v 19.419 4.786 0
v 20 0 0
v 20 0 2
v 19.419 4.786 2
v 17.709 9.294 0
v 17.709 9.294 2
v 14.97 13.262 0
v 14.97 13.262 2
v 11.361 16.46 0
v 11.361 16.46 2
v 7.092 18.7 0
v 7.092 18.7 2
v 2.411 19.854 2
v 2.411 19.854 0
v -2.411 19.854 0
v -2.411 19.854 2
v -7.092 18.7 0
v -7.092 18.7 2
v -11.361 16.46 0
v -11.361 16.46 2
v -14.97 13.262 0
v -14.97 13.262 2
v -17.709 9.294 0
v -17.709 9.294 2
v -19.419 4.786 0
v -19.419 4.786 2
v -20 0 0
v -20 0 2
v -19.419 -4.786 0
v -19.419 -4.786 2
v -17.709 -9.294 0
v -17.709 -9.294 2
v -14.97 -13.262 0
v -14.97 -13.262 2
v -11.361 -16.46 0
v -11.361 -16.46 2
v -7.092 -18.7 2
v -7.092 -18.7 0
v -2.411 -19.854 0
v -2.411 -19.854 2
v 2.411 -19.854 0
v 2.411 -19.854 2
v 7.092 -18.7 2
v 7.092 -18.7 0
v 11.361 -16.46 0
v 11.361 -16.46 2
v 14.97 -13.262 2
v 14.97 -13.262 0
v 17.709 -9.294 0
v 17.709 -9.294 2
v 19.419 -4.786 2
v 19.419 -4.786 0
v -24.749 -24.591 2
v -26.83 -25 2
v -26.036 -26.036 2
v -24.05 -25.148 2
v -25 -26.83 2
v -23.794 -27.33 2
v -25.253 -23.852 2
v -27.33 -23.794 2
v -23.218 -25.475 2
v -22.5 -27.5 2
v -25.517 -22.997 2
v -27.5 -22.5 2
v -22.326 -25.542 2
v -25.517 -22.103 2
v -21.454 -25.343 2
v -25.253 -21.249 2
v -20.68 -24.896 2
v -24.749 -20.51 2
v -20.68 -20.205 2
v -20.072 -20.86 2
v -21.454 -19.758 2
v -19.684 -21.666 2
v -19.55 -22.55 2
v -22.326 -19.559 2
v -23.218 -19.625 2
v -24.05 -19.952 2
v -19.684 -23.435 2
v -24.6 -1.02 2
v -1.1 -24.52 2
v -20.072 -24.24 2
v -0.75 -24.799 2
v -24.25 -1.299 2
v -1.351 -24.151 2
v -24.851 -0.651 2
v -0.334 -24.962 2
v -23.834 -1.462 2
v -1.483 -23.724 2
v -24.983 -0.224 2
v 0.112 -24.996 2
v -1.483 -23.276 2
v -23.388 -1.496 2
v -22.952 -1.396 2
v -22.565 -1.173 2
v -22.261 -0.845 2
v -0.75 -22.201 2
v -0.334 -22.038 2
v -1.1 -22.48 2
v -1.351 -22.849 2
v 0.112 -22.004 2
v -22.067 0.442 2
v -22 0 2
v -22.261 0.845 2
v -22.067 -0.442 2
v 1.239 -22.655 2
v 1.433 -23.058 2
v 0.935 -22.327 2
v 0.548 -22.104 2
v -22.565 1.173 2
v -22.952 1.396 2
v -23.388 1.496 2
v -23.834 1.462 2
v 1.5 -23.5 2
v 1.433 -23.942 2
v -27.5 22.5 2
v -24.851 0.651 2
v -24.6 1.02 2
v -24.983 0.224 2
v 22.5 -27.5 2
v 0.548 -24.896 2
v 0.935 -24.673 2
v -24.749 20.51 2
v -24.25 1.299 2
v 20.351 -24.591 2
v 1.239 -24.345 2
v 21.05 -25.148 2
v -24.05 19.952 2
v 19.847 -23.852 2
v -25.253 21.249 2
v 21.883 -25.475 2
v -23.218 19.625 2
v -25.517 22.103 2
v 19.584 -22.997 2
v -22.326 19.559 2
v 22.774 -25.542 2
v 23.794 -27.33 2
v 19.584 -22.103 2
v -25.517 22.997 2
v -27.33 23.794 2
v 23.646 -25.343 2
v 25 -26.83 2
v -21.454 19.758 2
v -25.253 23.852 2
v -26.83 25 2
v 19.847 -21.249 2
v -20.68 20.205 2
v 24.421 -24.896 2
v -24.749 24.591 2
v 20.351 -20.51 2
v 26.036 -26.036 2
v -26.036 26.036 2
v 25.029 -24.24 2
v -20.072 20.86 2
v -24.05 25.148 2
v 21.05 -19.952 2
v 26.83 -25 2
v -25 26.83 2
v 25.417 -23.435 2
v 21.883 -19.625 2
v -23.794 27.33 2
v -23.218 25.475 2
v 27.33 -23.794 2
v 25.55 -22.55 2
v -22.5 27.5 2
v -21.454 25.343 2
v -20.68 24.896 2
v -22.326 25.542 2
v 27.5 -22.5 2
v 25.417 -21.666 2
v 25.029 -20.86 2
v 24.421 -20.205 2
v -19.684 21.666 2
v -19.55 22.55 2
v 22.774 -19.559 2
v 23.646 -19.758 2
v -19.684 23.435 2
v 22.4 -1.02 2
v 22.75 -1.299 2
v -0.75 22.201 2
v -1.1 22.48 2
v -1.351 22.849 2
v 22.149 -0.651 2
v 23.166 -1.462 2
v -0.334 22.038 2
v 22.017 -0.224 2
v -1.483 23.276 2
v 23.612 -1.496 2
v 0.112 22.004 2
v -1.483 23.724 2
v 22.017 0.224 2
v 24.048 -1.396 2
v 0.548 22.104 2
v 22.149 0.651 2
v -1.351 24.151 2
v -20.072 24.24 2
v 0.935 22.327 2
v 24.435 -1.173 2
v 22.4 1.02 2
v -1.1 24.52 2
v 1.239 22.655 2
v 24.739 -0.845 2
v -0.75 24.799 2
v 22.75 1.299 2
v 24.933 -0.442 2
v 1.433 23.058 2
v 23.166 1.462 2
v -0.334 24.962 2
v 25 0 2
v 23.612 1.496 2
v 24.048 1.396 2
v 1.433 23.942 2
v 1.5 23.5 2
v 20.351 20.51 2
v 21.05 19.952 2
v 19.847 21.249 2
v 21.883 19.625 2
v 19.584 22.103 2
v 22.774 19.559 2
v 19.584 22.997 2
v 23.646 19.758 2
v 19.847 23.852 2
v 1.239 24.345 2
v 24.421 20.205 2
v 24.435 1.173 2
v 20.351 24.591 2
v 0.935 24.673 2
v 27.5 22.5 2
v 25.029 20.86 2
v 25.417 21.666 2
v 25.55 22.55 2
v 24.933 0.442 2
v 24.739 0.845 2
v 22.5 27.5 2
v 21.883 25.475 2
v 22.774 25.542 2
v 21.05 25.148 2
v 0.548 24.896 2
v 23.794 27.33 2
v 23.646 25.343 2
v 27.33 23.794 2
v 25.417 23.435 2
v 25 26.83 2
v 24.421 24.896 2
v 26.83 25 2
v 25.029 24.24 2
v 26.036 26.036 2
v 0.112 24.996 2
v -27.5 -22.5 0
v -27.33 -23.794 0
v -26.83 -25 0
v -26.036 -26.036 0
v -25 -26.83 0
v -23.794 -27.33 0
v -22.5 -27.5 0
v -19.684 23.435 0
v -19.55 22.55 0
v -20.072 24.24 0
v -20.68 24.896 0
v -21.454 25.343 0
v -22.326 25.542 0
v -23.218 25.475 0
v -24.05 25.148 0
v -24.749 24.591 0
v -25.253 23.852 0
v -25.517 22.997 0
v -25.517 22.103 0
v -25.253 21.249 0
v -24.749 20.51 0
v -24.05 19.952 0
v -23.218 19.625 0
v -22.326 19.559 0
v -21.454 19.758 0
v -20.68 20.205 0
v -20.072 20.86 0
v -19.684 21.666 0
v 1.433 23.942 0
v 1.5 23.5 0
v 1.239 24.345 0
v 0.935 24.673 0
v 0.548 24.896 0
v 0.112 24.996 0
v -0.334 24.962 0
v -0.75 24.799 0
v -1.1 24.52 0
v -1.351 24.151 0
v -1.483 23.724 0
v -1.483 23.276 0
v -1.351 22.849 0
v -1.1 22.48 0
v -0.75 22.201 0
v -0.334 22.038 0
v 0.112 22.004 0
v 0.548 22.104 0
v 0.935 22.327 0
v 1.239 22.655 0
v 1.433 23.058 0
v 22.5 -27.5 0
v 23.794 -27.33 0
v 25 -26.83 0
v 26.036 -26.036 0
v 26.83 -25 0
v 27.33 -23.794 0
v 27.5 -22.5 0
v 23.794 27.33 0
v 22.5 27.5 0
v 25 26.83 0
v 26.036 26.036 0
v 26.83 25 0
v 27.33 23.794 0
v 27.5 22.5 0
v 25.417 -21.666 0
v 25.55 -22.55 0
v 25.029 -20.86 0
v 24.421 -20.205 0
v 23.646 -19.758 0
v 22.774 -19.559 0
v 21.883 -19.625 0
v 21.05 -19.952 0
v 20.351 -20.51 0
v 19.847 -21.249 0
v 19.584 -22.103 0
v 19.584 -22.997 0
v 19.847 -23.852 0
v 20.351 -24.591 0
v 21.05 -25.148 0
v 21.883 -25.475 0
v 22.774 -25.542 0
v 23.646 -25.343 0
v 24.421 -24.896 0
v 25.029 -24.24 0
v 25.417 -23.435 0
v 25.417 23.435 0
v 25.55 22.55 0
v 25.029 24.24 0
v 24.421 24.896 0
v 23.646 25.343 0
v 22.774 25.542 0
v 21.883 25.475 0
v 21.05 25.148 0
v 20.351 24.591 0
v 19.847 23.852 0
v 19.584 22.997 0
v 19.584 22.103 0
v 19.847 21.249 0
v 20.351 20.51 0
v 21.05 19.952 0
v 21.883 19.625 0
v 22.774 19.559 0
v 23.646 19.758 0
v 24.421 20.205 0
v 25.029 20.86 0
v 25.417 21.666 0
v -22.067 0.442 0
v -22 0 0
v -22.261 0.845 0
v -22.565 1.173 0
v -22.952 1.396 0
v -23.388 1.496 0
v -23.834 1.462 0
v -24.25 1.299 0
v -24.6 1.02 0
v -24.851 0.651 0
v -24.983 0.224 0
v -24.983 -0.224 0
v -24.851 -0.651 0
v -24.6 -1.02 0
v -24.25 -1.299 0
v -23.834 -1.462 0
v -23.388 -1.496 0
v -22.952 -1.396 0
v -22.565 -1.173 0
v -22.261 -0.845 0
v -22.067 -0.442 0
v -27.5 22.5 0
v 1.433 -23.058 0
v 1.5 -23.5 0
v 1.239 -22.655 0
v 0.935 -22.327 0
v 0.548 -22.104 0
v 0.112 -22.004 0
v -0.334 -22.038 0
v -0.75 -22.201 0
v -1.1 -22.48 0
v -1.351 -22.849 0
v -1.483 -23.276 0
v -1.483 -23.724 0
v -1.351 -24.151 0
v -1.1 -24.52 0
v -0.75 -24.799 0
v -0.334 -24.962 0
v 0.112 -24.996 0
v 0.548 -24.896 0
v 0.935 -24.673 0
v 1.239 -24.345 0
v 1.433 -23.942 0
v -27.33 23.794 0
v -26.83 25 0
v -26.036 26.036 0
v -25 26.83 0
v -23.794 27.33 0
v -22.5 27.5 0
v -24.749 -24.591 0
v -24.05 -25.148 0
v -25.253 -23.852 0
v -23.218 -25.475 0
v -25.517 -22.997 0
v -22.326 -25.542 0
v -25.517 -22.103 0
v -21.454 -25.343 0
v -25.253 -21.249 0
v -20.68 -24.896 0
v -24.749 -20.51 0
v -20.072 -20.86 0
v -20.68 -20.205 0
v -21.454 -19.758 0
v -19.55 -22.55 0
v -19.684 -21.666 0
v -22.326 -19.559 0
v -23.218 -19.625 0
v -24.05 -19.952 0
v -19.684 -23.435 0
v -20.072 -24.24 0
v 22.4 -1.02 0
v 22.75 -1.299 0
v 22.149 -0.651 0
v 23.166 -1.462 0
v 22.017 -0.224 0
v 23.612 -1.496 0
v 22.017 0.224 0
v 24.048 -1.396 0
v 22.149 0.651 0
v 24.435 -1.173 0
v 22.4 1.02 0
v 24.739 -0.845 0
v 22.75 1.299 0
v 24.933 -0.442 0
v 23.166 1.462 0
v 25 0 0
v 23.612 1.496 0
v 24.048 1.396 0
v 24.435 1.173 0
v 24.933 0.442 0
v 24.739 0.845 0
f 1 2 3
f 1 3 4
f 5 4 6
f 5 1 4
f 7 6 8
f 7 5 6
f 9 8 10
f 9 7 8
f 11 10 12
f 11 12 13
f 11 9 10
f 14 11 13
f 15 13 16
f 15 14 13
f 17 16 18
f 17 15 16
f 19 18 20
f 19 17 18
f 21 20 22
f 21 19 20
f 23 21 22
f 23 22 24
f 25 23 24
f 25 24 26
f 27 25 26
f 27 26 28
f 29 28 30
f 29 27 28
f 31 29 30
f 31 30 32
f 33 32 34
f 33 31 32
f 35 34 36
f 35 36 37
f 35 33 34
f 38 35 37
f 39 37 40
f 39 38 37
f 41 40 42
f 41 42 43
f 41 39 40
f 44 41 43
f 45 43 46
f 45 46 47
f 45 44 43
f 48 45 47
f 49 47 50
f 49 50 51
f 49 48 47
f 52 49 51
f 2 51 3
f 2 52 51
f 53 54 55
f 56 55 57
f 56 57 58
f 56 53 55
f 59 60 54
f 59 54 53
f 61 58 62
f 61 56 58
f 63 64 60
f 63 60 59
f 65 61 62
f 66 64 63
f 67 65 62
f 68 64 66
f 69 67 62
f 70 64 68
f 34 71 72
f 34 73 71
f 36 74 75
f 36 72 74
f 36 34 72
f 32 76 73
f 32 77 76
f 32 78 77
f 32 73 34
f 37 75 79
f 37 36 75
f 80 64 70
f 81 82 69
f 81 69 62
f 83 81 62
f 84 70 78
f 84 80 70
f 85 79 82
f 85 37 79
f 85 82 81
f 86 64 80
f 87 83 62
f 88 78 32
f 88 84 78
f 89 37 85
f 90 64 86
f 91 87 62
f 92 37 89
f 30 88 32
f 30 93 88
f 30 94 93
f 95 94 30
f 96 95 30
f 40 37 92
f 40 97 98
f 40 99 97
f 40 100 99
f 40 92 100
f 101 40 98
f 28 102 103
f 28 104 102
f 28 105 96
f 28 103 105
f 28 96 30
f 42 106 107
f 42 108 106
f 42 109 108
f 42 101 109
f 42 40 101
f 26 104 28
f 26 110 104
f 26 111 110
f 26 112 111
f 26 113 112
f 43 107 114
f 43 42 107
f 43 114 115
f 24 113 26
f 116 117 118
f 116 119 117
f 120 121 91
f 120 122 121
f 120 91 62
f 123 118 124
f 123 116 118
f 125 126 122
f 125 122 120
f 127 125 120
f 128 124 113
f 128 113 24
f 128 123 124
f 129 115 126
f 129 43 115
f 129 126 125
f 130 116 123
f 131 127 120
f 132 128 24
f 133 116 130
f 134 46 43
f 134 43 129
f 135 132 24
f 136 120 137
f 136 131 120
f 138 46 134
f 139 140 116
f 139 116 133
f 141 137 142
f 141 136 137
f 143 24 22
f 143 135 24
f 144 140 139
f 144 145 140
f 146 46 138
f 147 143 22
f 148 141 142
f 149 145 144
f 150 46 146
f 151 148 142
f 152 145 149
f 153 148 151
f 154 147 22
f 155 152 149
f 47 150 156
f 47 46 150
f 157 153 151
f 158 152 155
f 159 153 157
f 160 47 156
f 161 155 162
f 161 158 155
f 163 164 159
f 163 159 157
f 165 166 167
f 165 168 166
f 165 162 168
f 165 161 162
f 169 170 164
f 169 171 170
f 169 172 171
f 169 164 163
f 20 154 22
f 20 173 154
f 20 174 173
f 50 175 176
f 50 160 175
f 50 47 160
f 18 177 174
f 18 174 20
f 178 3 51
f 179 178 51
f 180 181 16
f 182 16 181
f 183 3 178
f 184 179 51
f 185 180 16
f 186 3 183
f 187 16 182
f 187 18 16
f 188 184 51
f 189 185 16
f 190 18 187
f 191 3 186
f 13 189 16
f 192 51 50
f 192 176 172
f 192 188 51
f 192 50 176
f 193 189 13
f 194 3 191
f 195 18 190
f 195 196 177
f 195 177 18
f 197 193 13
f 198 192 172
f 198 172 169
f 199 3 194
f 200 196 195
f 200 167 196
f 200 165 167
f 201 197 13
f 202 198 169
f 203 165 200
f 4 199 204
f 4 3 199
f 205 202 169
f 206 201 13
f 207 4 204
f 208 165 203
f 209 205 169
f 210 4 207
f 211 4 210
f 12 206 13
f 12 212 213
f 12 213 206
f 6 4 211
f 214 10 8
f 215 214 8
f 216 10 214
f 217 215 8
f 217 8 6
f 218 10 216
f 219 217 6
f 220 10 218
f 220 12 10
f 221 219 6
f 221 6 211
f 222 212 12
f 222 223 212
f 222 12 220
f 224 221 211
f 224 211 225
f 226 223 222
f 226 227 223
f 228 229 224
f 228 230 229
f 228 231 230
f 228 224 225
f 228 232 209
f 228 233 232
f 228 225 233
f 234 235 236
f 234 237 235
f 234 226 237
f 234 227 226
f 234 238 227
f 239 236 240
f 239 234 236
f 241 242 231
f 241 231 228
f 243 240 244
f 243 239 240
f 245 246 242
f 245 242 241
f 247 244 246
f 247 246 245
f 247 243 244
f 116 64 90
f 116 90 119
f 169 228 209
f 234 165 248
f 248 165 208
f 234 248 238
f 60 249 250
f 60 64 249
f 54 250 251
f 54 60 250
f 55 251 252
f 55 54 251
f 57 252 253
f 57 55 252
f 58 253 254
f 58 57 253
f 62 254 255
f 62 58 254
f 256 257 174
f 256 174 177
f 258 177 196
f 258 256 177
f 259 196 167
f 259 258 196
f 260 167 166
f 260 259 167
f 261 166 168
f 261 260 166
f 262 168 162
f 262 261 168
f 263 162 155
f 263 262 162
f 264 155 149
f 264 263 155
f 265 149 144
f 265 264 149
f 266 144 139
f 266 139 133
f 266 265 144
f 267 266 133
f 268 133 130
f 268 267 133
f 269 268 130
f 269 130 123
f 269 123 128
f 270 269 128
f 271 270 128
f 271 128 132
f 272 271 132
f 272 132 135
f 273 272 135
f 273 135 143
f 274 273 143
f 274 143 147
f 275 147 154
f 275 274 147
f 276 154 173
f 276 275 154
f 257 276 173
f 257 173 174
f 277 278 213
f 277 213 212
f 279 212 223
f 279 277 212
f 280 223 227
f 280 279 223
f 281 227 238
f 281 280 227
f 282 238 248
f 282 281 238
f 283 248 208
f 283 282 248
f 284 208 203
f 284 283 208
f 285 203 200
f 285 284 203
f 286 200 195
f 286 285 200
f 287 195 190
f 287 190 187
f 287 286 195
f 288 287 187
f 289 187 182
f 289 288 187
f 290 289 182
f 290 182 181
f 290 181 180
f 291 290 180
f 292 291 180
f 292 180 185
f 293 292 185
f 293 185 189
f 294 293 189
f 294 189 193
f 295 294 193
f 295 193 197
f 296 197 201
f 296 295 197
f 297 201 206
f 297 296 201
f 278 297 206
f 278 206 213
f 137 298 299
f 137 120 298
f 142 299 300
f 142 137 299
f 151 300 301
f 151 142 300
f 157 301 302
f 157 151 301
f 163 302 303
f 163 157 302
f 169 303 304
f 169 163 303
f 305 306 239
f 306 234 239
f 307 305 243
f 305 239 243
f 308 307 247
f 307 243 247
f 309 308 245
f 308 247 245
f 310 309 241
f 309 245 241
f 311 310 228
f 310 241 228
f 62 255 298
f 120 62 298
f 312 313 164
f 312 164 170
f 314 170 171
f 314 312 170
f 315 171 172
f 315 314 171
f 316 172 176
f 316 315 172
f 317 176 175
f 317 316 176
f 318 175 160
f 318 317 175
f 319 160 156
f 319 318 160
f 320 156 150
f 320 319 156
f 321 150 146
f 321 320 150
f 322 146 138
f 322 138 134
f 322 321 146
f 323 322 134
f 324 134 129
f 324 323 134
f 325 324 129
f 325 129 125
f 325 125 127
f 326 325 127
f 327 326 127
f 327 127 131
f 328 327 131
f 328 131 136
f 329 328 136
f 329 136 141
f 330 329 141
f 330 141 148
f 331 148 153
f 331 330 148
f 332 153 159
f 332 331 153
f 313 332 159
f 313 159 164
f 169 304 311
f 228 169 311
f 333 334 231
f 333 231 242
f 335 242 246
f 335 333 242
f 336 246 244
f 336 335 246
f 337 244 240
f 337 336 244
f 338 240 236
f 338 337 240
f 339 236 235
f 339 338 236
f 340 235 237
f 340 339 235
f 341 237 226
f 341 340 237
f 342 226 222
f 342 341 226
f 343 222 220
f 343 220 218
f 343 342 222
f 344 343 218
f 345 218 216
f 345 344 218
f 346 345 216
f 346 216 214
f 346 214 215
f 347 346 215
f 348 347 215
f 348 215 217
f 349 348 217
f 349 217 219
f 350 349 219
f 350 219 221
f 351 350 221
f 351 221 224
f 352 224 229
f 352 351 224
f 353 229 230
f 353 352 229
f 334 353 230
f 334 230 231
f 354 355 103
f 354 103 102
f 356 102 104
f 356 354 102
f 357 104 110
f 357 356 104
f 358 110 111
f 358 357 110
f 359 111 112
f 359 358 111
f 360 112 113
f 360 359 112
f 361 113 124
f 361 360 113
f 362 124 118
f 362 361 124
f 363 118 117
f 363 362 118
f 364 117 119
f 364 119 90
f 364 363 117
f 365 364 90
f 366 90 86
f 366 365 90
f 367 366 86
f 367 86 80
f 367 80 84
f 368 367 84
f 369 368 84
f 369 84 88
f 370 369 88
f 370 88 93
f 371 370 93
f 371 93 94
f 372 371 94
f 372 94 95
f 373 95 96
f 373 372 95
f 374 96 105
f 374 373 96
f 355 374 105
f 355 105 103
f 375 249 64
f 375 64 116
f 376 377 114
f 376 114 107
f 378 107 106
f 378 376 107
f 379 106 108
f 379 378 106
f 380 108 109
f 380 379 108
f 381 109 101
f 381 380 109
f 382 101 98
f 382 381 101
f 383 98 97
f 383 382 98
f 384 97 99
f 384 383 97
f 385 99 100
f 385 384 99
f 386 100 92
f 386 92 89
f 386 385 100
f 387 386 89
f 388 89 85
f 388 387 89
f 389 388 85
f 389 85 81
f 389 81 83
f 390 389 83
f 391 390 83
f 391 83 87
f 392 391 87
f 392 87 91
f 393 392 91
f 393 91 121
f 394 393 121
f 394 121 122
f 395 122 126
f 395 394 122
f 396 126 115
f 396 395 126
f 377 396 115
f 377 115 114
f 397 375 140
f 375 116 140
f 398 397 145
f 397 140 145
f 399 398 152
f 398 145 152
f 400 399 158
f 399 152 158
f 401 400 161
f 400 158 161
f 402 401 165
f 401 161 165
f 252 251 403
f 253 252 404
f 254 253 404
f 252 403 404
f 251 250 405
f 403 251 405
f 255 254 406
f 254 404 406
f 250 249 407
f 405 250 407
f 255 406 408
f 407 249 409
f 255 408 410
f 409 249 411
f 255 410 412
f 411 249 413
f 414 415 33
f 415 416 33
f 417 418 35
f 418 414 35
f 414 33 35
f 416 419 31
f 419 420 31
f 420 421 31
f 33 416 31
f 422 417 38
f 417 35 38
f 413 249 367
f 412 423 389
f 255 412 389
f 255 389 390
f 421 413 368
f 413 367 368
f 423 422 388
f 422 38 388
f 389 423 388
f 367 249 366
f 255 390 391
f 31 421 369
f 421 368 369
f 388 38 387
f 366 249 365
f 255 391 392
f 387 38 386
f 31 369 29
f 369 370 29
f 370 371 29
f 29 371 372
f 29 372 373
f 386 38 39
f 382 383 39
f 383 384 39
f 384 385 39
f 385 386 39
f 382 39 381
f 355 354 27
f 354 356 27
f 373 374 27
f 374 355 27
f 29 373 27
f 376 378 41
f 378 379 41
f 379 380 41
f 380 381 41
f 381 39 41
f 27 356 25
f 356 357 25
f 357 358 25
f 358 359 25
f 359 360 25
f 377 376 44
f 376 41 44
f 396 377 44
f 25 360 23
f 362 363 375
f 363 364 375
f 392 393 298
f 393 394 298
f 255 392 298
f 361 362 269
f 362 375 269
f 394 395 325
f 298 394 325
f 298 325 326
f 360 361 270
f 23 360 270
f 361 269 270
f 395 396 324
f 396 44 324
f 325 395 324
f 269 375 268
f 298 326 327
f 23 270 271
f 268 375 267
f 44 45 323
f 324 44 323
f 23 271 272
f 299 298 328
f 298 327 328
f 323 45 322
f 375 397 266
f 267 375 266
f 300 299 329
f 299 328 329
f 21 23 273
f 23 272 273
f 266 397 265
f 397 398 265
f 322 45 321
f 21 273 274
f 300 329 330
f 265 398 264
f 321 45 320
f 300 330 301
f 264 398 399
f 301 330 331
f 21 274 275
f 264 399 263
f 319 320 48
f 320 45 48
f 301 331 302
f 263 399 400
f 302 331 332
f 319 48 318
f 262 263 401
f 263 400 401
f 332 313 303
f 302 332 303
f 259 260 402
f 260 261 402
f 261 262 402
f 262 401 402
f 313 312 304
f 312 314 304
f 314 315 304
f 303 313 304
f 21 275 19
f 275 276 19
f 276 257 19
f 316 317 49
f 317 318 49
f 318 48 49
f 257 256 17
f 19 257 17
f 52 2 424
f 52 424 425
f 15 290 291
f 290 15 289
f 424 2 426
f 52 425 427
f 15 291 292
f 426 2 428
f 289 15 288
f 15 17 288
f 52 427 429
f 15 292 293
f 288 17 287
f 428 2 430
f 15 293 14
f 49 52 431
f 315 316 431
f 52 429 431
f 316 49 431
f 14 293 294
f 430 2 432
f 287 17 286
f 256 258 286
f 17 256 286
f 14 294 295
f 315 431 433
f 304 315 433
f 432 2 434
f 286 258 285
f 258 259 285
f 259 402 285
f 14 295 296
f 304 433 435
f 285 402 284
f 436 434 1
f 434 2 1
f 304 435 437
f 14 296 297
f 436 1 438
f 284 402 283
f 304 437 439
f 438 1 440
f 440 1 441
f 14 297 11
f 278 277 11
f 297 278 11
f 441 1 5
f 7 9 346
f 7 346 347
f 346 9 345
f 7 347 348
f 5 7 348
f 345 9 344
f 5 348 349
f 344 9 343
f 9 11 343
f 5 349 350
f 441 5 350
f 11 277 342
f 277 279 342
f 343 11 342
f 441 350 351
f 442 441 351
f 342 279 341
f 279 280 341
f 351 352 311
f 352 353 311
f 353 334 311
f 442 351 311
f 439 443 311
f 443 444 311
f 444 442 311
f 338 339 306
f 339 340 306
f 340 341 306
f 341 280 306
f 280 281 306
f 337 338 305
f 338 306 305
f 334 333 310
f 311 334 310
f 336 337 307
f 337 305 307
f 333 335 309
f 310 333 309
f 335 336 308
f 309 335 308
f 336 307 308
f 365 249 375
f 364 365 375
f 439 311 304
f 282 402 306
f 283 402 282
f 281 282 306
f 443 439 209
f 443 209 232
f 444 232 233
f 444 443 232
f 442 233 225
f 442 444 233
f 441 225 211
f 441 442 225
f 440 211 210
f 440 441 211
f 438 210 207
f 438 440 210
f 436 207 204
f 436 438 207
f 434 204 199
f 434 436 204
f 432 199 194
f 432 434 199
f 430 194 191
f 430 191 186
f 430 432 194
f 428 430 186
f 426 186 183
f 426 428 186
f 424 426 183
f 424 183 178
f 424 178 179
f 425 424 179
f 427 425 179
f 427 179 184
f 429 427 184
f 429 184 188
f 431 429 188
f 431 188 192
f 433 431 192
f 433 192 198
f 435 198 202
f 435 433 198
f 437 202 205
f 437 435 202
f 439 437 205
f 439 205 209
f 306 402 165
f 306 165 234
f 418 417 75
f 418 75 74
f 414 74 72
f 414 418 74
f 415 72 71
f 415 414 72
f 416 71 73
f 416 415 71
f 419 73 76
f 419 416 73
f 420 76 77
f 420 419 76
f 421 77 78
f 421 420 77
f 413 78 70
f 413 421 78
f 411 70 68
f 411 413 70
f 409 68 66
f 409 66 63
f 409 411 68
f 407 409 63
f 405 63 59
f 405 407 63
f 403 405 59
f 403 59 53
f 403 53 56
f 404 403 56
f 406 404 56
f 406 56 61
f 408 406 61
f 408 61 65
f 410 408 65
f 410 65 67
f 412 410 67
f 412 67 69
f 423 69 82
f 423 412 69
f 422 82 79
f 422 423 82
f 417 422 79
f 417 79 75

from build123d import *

# Parameters (mm, degrees)
CROQUIS1_W              = 55
CROQUIS1_H              = 55
CROQUIS1_R              = 20
CROQUIS1_R_2            = 3
CROQUIS1_R_3            = 1.5
SALIENTE_EXTRUIR1_DEPTH = 2
REDONDEO1_R             = 5


with BuildPart() as part:
    # Croquis1 → Saliente-Extruir1 (new body)
    with BuildSketch(Plane.XY):
        Rectangle(CROQUIS1_W, CROQUIS1_H)
        Circle(CROQUIS1_R, mode=Mode.SUBTRACT)
        with Locations((-22.550252532, 22.550252532)):
            Circle(CROQUIS1_R_2, mode=Mode.SUBTRACT)
        with Locations((22.550252532, 22.550252532)):
            Circle(CROQUIS1_R_2, mode=Mode.SUBTRACT)
        with Locations((22.550252532, -22.550252532)):
            Circle(CROQUIS1_R_2, mode=Mode.SUBTRACT)
        with Locations((-22.550252532, -22.550252532)):
            Circle(CROQUIS1_R_2, mode=Mode.SUBTRACT)
        with Locations((0, 23.5)):
            Circle(CROQUIS1_R_3, mode=Mode.SUBTRACT)
        with Locations((23.5, 0)):
            Circle(CROQUIS1_R_3, mode=Mode.SUBTRACT)
        with Locations((0, -23.5)):
            Circle(CROQUIS1_R_3, mode=Mode.SUBTRACT)
        with Locations((-23.5, 0)):
            Circle(CROQUIS1_R_3, mode=Mode.SUBTRACT)
    extrude(amount=SALIENTE_EXTRUIR1_DEPTH)

    # Redondeo1
    redondeo1_edges = [part.edges().sort_by_distance(p)[0] for p in [
        (-27.5, 27.5, 1),
        (27.5, 27.5, 1),
        (27.5, -27.5, 1),
        (-27.5, -27.5, 1),
    ]]
    fillet(redondeo1_edges, radius=REDONDEO1_R)


solid = part.part
